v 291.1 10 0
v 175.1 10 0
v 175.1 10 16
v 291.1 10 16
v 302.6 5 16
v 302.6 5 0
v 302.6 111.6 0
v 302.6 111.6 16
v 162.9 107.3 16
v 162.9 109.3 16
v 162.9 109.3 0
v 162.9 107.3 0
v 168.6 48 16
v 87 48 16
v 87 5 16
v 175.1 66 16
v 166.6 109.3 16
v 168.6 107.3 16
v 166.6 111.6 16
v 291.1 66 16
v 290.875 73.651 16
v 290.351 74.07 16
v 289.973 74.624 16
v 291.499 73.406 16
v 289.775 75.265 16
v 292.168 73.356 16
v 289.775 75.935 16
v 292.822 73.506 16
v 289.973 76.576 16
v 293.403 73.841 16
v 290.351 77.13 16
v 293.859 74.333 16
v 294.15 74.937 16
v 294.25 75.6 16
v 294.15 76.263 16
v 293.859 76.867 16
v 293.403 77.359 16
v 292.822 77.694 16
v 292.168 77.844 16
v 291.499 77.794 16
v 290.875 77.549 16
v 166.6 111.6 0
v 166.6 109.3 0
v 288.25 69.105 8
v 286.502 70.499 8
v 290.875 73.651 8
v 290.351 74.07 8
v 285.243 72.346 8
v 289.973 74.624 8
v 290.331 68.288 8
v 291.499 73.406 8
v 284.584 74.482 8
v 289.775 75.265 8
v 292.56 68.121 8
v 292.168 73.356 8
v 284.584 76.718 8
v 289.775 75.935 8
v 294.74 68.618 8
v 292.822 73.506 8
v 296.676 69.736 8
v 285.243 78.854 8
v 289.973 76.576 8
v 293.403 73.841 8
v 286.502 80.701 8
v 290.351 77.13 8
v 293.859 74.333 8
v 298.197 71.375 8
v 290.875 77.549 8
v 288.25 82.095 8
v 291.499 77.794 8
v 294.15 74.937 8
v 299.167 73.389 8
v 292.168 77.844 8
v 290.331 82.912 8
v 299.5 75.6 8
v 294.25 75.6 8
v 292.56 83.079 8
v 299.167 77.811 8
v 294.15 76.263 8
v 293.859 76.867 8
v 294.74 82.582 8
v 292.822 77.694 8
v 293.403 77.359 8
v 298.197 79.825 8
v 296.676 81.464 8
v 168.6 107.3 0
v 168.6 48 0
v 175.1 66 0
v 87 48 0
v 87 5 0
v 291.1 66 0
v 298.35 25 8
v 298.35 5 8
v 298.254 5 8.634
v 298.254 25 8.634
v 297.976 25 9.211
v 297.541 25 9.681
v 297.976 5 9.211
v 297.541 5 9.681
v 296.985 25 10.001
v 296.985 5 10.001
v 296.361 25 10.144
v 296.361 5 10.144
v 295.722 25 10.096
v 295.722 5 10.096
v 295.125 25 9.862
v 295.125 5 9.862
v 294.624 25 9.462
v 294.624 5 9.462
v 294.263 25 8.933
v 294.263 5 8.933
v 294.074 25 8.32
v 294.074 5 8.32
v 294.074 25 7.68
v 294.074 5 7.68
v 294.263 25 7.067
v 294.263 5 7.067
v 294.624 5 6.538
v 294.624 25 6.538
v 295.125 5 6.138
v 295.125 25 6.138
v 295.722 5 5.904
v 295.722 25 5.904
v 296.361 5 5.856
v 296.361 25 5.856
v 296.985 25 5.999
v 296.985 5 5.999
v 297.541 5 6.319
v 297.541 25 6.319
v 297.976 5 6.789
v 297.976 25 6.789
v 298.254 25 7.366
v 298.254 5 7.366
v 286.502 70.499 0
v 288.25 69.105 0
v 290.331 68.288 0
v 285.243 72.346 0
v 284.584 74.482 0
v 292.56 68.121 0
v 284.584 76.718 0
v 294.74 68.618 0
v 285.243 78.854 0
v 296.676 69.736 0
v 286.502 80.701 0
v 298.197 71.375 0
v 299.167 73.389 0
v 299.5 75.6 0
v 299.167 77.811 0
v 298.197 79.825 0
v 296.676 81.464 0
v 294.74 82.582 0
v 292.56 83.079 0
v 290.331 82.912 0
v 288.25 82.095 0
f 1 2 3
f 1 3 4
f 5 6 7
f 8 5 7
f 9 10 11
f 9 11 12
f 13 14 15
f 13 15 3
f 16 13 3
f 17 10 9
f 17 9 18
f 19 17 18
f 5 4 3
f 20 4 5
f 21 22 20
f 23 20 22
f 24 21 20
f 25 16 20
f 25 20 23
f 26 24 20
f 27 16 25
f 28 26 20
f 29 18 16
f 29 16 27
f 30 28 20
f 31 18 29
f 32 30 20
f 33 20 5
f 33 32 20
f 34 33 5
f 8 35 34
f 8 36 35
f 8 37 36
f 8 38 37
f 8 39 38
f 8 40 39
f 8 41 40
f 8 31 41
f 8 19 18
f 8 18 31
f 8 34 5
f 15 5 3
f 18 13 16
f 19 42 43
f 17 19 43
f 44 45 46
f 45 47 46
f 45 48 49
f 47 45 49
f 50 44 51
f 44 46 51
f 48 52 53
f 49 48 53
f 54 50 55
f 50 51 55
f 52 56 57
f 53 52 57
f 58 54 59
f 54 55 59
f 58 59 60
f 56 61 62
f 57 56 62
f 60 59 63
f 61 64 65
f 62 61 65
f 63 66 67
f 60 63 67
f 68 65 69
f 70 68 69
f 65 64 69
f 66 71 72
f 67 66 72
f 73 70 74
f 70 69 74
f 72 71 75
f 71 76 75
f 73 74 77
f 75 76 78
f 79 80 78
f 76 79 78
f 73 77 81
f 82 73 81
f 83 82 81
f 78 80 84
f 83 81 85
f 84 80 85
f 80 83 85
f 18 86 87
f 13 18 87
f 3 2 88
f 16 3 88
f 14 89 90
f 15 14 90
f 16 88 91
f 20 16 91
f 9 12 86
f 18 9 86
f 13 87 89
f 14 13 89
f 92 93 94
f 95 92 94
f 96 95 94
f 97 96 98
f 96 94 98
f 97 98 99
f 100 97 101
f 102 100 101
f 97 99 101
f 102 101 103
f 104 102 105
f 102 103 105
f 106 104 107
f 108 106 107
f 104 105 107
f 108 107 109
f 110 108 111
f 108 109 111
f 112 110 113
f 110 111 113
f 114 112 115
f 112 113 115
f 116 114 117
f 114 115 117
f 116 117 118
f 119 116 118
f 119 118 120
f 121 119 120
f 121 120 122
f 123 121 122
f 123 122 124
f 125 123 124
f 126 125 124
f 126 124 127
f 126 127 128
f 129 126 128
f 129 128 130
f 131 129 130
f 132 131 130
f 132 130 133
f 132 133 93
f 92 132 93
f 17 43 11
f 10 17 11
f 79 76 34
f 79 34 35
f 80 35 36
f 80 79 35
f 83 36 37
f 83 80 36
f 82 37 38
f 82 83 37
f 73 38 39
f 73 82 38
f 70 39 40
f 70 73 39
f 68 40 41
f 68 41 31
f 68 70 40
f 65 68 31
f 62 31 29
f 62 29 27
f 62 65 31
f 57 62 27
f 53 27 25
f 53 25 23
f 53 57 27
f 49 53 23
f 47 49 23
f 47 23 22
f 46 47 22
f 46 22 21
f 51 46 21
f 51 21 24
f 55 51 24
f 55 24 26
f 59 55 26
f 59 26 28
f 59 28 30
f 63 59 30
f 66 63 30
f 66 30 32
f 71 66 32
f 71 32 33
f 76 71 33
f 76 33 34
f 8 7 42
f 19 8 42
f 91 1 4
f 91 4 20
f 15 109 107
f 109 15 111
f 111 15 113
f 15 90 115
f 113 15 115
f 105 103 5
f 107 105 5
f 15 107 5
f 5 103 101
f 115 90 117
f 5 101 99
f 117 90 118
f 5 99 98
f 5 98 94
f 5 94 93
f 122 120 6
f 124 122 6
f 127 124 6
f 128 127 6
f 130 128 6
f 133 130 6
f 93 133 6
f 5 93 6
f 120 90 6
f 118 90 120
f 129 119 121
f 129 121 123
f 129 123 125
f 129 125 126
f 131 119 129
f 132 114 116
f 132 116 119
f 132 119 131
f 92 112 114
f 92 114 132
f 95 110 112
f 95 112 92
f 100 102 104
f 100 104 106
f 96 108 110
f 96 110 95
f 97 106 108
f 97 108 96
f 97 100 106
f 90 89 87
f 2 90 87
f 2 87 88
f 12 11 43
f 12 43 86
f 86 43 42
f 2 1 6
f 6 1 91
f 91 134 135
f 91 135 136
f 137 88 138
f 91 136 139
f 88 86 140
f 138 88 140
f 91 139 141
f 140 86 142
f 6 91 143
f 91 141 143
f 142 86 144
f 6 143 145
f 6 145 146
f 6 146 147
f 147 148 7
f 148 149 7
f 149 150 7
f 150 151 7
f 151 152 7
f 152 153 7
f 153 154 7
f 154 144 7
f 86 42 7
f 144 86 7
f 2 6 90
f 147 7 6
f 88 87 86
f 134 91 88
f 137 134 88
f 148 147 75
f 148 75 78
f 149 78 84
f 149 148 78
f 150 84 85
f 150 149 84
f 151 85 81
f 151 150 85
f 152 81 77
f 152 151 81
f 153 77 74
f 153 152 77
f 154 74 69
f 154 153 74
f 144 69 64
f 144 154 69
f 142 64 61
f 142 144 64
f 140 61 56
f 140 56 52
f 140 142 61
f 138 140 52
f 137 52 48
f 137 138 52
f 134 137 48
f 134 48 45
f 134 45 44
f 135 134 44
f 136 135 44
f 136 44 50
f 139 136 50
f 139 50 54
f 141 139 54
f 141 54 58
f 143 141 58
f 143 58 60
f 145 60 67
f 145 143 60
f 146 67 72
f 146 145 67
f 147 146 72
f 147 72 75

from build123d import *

# Parameters (mm, degrees)
SKETCH_R             = 2.25
PAD_DEPTH            = 16
SKETCH002_W          = 116
SKETCH002_H          = 56
POCKET001_DEPTH      = 0.001
POCKET001_DEPTH_BACK = -16.001
SKETCH003_W          = 129
SKETCH003_H          = 62
POCKET002_DEPTH      = 6
SKETCH004_R          = 7.5
POCKET_DEPTH         = 8
SKETCH005_R          = 2.15
POCKET003_DEPTH      = 25


with BuildPart() as part:
    # Sketch → Pad (new body)
    with BuildSketch(Plane.XY):
        Polygon((87, 5), (302.6, 5), (302.6, 111.6), (166.6, 111.6), (166.6, 109.3), (162.9, 109.3), (162.9, 107.3), (168.6, 107.3), (168.6, 48), (87, 48), align=None)
        with Locations((292, 75.6)):
            Circle(SKETCH_R, mode=Mode.SUBTRACT)
    extrude(amount=PAD_DEPTH)

    # Sketch002 → Pocket001 (cut, two sides)
    with BuildSketch(Plane.XY) as pocket001_sk:
        with Locations((233.1, 38)):
            Rectangle(SKETCH002_W, SKETCH002_H)
    extrude(amount=-POCKET001_DEPTH, mode=Mode.SUBTRACT)
    extrude(pocket001_sk.sketch, amount=-POCKET001_DEPTH_BACK, mode=Mode.SUBTRACT)

    # Sketch003 (on DatumPlane) → Pocket002 (cut)
    with BuildSketch(Plane.XY.offset(24)):
        with Locations((233.1, 36)):
            Rectangle(SKETCH003_W, SKETCH003_H)
    extrude(amount=-POCKET002_DEPTH, mode=Mode.SUBTRACT)

    # Sketch004 → Pocket (cut)
    with BuildSketch(Plane.XY):
        with Locations((292, 75.6)):
            Circle(SKETCH004_R)
    extrude(amount=POCKET_DEPTH, mode=Mode.SUBTRACT)

    # Sketch005 → Pocket003 (cut)
    with BuildSketch(Plane.XZ):
        with Locations((296.2, 8)):
            Circle(SKETCH005_R)
    extrude(amount=-POCKET003_DEPTH, mode=Mode.SUBTRACT)


solid = part.part
